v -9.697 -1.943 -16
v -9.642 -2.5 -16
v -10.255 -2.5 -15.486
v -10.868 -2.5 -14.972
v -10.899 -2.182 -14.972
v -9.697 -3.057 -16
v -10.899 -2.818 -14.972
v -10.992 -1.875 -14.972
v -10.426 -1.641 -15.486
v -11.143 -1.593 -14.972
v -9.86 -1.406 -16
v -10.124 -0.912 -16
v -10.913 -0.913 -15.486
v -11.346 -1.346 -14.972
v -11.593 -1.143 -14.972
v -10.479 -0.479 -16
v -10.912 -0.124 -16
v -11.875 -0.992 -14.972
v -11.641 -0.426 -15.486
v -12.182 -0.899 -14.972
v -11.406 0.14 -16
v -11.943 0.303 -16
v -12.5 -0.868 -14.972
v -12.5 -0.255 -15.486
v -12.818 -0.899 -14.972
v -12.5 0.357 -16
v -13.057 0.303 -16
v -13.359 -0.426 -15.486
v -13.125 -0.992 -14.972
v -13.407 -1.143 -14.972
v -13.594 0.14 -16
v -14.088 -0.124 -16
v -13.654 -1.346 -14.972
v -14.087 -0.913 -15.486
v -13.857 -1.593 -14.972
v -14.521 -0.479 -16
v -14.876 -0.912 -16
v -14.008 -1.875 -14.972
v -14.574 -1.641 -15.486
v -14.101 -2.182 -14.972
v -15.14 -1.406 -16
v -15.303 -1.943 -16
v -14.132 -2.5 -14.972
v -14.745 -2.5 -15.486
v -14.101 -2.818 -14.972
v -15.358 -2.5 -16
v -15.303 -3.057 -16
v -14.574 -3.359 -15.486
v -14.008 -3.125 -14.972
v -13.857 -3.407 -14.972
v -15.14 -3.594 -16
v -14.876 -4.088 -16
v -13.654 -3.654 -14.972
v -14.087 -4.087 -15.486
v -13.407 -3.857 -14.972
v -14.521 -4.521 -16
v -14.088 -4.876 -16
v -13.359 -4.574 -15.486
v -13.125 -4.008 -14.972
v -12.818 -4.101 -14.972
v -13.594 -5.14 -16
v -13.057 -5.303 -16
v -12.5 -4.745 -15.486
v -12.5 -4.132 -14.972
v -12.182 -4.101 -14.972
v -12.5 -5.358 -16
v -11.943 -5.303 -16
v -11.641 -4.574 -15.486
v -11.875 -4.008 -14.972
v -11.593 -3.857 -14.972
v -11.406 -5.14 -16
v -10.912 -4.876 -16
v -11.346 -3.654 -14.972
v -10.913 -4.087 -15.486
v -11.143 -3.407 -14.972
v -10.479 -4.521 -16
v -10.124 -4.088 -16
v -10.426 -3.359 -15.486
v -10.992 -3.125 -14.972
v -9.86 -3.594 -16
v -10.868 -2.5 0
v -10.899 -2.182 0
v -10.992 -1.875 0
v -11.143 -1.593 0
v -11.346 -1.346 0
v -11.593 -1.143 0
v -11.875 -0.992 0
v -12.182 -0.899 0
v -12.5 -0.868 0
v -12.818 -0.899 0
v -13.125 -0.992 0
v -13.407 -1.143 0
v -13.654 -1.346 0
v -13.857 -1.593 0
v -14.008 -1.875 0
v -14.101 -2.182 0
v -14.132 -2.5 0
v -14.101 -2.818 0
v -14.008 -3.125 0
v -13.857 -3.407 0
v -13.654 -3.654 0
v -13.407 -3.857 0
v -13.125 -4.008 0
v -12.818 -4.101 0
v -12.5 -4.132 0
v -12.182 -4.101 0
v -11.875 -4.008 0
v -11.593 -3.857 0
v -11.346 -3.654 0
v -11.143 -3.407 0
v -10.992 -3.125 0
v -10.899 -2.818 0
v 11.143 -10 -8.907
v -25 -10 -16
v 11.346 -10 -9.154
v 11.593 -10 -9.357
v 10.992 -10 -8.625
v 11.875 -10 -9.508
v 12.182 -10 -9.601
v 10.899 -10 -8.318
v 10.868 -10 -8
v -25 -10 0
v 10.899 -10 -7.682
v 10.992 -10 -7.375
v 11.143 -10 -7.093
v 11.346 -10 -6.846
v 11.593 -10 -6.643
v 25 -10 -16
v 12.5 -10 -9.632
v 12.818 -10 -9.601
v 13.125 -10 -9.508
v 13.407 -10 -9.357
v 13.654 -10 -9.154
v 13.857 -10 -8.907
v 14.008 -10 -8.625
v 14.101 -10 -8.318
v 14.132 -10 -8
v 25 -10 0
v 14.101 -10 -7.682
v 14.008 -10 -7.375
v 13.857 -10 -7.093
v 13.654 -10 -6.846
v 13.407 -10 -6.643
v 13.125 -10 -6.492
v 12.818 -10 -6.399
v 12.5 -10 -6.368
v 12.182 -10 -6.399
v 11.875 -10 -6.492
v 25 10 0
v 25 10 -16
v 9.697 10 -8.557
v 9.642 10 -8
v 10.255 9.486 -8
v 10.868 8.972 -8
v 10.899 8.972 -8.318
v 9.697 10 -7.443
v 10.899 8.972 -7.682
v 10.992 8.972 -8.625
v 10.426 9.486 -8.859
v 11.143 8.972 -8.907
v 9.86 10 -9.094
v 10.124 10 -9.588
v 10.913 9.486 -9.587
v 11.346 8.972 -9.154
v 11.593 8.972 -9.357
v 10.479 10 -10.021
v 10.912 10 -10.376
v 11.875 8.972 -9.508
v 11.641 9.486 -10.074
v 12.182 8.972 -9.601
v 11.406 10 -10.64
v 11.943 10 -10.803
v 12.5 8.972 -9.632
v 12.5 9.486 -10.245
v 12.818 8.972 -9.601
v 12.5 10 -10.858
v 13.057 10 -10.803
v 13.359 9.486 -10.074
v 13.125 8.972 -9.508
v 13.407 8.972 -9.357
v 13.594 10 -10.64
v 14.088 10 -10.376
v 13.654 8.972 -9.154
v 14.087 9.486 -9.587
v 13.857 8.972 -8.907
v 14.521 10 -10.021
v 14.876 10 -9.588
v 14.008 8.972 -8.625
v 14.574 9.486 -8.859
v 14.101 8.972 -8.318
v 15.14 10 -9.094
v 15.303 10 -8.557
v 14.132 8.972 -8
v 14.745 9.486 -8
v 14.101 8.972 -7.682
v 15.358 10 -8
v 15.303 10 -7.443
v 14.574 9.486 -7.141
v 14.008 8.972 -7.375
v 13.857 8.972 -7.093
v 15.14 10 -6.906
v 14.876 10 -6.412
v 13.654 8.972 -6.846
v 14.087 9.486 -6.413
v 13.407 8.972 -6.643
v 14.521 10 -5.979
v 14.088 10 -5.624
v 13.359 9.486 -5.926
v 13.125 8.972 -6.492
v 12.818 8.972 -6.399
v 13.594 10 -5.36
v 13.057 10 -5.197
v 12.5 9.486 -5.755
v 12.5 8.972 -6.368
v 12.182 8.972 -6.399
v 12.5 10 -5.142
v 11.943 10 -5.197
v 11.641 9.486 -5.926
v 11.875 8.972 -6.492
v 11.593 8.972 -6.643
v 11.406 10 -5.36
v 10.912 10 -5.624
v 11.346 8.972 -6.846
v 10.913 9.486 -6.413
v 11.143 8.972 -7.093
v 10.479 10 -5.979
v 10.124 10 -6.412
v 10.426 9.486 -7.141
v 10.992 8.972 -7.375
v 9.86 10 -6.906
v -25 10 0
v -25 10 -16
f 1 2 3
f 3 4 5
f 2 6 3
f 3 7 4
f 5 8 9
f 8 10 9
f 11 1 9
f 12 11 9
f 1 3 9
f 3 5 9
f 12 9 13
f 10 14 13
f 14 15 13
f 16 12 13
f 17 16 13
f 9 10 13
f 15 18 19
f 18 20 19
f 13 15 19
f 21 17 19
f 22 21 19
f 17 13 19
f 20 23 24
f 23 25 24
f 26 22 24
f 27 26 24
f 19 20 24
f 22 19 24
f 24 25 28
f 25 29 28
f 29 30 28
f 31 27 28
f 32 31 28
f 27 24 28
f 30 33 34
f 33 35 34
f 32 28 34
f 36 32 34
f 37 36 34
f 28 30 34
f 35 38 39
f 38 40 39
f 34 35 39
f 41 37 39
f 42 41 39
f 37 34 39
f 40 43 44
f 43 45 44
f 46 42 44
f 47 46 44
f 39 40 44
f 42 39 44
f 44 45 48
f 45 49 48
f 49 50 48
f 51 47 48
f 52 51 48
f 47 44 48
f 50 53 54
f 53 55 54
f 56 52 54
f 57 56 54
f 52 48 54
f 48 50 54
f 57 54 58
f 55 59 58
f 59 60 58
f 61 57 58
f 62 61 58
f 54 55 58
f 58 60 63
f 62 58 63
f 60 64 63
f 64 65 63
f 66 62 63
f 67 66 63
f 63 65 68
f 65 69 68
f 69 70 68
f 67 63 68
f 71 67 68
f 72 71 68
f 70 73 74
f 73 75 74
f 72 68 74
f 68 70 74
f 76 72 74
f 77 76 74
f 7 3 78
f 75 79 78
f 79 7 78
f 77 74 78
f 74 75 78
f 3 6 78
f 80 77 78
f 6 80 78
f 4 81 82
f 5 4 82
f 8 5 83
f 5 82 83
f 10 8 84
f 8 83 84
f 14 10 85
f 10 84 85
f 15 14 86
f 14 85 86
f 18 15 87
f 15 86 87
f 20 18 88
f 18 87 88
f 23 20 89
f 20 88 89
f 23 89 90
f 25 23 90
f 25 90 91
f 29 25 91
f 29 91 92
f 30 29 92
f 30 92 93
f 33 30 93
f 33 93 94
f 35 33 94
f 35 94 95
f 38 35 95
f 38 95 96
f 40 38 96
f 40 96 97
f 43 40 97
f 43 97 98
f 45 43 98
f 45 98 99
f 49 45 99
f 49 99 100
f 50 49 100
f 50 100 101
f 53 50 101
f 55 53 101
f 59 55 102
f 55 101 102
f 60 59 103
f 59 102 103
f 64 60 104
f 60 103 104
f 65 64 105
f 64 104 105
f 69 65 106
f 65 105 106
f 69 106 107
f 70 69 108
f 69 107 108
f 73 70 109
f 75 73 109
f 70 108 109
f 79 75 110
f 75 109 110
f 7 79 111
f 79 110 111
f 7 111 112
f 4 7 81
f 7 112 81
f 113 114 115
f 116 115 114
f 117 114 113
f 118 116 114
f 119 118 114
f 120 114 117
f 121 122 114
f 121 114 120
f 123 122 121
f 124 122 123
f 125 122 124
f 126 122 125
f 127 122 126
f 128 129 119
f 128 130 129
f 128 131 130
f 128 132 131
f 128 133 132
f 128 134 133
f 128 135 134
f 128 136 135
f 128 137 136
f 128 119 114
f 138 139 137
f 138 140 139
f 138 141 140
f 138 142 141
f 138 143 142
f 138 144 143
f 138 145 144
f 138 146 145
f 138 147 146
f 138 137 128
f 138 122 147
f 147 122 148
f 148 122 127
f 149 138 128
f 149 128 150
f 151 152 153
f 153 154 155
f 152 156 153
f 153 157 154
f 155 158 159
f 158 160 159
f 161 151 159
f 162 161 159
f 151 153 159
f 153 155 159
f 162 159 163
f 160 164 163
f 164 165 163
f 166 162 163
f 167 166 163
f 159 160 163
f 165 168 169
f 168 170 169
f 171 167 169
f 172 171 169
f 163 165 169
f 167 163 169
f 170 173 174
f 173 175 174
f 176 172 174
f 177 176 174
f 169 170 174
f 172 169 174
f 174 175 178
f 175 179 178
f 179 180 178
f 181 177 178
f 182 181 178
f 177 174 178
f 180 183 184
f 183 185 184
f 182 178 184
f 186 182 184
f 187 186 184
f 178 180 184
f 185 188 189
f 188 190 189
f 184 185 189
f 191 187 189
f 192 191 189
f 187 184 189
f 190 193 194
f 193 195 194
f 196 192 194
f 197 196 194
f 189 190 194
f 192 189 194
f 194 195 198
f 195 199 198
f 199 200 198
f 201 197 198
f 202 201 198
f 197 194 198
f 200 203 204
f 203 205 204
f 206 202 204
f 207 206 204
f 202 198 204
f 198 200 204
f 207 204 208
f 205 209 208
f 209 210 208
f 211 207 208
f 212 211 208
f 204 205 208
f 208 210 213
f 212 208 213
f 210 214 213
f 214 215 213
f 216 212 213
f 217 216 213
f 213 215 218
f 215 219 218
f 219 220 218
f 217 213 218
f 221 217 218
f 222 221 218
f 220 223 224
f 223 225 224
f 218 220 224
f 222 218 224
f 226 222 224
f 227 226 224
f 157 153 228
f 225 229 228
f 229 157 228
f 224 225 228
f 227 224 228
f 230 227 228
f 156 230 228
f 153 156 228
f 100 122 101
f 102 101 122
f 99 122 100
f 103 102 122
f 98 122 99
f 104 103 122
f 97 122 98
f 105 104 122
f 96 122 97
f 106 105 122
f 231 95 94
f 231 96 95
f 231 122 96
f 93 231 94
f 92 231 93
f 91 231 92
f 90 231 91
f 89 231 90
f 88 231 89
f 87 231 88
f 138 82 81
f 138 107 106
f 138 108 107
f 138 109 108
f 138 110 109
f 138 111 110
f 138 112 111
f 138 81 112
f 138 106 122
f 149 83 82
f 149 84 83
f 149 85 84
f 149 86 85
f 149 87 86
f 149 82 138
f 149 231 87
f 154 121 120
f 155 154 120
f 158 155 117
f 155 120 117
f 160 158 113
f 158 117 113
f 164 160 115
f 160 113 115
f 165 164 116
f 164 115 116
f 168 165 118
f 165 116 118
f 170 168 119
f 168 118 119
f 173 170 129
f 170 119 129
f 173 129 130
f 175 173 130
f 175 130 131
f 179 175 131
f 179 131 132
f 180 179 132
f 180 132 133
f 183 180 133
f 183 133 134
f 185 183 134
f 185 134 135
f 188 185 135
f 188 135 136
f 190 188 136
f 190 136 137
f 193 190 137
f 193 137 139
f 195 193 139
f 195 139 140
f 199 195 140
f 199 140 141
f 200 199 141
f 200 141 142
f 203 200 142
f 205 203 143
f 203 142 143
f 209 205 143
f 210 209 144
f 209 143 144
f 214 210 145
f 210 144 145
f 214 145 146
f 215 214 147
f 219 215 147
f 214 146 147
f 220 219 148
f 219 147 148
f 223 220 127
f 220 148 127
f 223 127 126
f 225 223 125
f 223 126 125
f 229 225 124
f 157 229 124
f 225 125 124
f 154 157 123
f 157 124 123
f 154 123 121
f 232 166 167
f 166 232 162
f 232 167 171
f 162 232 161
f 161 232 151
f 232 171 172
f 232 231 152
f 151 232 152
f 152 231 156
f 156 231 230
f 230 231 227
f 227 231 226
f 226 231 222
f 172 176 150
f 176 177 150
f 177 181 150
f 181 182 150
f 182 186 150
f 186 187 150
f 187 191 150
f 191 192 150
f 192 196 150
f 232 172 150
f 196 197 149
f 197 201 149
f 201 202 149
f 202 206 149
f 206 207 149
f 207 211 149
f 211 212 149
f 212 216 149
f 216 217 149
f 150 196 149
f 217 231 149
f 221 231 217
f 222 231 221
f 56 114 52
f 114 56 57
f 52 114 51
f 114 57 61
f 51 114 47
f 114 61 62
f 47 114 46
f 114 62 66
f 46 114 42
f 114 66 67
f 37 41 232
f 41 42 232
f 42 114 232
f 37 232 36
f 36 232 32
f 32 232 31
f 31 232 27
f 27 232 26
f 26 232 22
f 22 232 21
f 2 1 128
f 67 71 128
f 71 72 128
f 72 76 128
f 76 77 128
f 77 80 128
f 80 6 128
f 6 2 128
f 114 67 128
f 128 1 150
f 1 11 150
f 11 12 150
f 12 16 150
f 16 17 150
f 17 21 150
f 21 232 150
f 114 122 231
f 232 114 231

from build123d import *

# Parameters (mm, degrees)
SKETCH1_W                                         = 50
SKETCH1_H                                         = 20
BOSS_EXTRUDE1_DEPTH                               = 16
CSK_FOR_4_FLAT_HEAD_MACHINE_SCREW_100_D           = 3.2639
CSK_FOR_4_FLAT_HEAD_MACHINE_SCREW_100_DEPTH       = 16
CSK_FOR_4_FLAT_HEAD_MACHINE_SCREW_100_CSINK_D     = 5.715
CSK_FOR_4_FLAT_HEAD_MACHINE_SCREW_100_CSINK_ANGLE = 100
CSK_FOR_4_FLAT_HEAD_MACHINE_SCREW_2_D             = 3.2639
CSK_FOR_4_FLAT_HEAD_MACHINE_SCREW_2_DEPTH         = 20
CSK_FOR_4_FLAT_HEAD_MACHINE_SCREW_2_CSINK_D       = 5.715
CSK_FOR_4_FLAT_HEAD_MACHINE_SCREW_2_CSINK_ANGLE   = 100


with BuildPart() as part:
    # Sketch1 → Boss-Extrude1 (new body)
    with BuildSketch(Plane.XY):
        Rectangle(SKETCH1_W, SKETCH1_H)
    extrude(amount=-BOSS_EXTRUDE1_DEPTH)

    # CSK for _4 Flat Head Machine Screw _100
    with Locations(Plane(origin=(-12.5, -2.5, -16), x_dir=(-1, 0, 0), z_dir=(0, 0, -1))):
        with Locations((0, 0)):
            CounterSinkHole(CSK_FOR_4_FLAT_HEAD_MACHINE_SCREW_100_D / 2, CSK_FOR_4_FLAT_HEAD_MACHINE_SCREW_100_CSINK_D / 2, depth=CSK_FOR_4_FLAT_HEAD_MACHINE_SCREW_100_DEPTH, counter_sink_angle=CSK_FOR_4_FLAT_HEAD_MACHINE_SCREW_100_CSINK_ANGLE)

    # CSK for _4 Flat Head Machine Screw _ 2
    with Locations(Plane(origin=(0, 10, 0), x_dir=(1, 0, 0), z_dir=(0, 1, 0))):
        with Locations((12.5, 8)):
            CounterSinkHole(CSK_FOR_4_FLAT_HEAD_MACHINE_SCREW_2_D / 2, CSK_FOR_4_FLAT_HEAD_MACHINE_SCREW_2_CSINK_D / 2, depth=CSK_FOR_4_FLAT_HEAD_MACHINE_SCREW_2_DEPTH, counter_sink_angle=CSK_FOR_4_FLAT_HEAD_MACHINE_SCREW_2_CSINK_ANGLE)


solid = part.part
